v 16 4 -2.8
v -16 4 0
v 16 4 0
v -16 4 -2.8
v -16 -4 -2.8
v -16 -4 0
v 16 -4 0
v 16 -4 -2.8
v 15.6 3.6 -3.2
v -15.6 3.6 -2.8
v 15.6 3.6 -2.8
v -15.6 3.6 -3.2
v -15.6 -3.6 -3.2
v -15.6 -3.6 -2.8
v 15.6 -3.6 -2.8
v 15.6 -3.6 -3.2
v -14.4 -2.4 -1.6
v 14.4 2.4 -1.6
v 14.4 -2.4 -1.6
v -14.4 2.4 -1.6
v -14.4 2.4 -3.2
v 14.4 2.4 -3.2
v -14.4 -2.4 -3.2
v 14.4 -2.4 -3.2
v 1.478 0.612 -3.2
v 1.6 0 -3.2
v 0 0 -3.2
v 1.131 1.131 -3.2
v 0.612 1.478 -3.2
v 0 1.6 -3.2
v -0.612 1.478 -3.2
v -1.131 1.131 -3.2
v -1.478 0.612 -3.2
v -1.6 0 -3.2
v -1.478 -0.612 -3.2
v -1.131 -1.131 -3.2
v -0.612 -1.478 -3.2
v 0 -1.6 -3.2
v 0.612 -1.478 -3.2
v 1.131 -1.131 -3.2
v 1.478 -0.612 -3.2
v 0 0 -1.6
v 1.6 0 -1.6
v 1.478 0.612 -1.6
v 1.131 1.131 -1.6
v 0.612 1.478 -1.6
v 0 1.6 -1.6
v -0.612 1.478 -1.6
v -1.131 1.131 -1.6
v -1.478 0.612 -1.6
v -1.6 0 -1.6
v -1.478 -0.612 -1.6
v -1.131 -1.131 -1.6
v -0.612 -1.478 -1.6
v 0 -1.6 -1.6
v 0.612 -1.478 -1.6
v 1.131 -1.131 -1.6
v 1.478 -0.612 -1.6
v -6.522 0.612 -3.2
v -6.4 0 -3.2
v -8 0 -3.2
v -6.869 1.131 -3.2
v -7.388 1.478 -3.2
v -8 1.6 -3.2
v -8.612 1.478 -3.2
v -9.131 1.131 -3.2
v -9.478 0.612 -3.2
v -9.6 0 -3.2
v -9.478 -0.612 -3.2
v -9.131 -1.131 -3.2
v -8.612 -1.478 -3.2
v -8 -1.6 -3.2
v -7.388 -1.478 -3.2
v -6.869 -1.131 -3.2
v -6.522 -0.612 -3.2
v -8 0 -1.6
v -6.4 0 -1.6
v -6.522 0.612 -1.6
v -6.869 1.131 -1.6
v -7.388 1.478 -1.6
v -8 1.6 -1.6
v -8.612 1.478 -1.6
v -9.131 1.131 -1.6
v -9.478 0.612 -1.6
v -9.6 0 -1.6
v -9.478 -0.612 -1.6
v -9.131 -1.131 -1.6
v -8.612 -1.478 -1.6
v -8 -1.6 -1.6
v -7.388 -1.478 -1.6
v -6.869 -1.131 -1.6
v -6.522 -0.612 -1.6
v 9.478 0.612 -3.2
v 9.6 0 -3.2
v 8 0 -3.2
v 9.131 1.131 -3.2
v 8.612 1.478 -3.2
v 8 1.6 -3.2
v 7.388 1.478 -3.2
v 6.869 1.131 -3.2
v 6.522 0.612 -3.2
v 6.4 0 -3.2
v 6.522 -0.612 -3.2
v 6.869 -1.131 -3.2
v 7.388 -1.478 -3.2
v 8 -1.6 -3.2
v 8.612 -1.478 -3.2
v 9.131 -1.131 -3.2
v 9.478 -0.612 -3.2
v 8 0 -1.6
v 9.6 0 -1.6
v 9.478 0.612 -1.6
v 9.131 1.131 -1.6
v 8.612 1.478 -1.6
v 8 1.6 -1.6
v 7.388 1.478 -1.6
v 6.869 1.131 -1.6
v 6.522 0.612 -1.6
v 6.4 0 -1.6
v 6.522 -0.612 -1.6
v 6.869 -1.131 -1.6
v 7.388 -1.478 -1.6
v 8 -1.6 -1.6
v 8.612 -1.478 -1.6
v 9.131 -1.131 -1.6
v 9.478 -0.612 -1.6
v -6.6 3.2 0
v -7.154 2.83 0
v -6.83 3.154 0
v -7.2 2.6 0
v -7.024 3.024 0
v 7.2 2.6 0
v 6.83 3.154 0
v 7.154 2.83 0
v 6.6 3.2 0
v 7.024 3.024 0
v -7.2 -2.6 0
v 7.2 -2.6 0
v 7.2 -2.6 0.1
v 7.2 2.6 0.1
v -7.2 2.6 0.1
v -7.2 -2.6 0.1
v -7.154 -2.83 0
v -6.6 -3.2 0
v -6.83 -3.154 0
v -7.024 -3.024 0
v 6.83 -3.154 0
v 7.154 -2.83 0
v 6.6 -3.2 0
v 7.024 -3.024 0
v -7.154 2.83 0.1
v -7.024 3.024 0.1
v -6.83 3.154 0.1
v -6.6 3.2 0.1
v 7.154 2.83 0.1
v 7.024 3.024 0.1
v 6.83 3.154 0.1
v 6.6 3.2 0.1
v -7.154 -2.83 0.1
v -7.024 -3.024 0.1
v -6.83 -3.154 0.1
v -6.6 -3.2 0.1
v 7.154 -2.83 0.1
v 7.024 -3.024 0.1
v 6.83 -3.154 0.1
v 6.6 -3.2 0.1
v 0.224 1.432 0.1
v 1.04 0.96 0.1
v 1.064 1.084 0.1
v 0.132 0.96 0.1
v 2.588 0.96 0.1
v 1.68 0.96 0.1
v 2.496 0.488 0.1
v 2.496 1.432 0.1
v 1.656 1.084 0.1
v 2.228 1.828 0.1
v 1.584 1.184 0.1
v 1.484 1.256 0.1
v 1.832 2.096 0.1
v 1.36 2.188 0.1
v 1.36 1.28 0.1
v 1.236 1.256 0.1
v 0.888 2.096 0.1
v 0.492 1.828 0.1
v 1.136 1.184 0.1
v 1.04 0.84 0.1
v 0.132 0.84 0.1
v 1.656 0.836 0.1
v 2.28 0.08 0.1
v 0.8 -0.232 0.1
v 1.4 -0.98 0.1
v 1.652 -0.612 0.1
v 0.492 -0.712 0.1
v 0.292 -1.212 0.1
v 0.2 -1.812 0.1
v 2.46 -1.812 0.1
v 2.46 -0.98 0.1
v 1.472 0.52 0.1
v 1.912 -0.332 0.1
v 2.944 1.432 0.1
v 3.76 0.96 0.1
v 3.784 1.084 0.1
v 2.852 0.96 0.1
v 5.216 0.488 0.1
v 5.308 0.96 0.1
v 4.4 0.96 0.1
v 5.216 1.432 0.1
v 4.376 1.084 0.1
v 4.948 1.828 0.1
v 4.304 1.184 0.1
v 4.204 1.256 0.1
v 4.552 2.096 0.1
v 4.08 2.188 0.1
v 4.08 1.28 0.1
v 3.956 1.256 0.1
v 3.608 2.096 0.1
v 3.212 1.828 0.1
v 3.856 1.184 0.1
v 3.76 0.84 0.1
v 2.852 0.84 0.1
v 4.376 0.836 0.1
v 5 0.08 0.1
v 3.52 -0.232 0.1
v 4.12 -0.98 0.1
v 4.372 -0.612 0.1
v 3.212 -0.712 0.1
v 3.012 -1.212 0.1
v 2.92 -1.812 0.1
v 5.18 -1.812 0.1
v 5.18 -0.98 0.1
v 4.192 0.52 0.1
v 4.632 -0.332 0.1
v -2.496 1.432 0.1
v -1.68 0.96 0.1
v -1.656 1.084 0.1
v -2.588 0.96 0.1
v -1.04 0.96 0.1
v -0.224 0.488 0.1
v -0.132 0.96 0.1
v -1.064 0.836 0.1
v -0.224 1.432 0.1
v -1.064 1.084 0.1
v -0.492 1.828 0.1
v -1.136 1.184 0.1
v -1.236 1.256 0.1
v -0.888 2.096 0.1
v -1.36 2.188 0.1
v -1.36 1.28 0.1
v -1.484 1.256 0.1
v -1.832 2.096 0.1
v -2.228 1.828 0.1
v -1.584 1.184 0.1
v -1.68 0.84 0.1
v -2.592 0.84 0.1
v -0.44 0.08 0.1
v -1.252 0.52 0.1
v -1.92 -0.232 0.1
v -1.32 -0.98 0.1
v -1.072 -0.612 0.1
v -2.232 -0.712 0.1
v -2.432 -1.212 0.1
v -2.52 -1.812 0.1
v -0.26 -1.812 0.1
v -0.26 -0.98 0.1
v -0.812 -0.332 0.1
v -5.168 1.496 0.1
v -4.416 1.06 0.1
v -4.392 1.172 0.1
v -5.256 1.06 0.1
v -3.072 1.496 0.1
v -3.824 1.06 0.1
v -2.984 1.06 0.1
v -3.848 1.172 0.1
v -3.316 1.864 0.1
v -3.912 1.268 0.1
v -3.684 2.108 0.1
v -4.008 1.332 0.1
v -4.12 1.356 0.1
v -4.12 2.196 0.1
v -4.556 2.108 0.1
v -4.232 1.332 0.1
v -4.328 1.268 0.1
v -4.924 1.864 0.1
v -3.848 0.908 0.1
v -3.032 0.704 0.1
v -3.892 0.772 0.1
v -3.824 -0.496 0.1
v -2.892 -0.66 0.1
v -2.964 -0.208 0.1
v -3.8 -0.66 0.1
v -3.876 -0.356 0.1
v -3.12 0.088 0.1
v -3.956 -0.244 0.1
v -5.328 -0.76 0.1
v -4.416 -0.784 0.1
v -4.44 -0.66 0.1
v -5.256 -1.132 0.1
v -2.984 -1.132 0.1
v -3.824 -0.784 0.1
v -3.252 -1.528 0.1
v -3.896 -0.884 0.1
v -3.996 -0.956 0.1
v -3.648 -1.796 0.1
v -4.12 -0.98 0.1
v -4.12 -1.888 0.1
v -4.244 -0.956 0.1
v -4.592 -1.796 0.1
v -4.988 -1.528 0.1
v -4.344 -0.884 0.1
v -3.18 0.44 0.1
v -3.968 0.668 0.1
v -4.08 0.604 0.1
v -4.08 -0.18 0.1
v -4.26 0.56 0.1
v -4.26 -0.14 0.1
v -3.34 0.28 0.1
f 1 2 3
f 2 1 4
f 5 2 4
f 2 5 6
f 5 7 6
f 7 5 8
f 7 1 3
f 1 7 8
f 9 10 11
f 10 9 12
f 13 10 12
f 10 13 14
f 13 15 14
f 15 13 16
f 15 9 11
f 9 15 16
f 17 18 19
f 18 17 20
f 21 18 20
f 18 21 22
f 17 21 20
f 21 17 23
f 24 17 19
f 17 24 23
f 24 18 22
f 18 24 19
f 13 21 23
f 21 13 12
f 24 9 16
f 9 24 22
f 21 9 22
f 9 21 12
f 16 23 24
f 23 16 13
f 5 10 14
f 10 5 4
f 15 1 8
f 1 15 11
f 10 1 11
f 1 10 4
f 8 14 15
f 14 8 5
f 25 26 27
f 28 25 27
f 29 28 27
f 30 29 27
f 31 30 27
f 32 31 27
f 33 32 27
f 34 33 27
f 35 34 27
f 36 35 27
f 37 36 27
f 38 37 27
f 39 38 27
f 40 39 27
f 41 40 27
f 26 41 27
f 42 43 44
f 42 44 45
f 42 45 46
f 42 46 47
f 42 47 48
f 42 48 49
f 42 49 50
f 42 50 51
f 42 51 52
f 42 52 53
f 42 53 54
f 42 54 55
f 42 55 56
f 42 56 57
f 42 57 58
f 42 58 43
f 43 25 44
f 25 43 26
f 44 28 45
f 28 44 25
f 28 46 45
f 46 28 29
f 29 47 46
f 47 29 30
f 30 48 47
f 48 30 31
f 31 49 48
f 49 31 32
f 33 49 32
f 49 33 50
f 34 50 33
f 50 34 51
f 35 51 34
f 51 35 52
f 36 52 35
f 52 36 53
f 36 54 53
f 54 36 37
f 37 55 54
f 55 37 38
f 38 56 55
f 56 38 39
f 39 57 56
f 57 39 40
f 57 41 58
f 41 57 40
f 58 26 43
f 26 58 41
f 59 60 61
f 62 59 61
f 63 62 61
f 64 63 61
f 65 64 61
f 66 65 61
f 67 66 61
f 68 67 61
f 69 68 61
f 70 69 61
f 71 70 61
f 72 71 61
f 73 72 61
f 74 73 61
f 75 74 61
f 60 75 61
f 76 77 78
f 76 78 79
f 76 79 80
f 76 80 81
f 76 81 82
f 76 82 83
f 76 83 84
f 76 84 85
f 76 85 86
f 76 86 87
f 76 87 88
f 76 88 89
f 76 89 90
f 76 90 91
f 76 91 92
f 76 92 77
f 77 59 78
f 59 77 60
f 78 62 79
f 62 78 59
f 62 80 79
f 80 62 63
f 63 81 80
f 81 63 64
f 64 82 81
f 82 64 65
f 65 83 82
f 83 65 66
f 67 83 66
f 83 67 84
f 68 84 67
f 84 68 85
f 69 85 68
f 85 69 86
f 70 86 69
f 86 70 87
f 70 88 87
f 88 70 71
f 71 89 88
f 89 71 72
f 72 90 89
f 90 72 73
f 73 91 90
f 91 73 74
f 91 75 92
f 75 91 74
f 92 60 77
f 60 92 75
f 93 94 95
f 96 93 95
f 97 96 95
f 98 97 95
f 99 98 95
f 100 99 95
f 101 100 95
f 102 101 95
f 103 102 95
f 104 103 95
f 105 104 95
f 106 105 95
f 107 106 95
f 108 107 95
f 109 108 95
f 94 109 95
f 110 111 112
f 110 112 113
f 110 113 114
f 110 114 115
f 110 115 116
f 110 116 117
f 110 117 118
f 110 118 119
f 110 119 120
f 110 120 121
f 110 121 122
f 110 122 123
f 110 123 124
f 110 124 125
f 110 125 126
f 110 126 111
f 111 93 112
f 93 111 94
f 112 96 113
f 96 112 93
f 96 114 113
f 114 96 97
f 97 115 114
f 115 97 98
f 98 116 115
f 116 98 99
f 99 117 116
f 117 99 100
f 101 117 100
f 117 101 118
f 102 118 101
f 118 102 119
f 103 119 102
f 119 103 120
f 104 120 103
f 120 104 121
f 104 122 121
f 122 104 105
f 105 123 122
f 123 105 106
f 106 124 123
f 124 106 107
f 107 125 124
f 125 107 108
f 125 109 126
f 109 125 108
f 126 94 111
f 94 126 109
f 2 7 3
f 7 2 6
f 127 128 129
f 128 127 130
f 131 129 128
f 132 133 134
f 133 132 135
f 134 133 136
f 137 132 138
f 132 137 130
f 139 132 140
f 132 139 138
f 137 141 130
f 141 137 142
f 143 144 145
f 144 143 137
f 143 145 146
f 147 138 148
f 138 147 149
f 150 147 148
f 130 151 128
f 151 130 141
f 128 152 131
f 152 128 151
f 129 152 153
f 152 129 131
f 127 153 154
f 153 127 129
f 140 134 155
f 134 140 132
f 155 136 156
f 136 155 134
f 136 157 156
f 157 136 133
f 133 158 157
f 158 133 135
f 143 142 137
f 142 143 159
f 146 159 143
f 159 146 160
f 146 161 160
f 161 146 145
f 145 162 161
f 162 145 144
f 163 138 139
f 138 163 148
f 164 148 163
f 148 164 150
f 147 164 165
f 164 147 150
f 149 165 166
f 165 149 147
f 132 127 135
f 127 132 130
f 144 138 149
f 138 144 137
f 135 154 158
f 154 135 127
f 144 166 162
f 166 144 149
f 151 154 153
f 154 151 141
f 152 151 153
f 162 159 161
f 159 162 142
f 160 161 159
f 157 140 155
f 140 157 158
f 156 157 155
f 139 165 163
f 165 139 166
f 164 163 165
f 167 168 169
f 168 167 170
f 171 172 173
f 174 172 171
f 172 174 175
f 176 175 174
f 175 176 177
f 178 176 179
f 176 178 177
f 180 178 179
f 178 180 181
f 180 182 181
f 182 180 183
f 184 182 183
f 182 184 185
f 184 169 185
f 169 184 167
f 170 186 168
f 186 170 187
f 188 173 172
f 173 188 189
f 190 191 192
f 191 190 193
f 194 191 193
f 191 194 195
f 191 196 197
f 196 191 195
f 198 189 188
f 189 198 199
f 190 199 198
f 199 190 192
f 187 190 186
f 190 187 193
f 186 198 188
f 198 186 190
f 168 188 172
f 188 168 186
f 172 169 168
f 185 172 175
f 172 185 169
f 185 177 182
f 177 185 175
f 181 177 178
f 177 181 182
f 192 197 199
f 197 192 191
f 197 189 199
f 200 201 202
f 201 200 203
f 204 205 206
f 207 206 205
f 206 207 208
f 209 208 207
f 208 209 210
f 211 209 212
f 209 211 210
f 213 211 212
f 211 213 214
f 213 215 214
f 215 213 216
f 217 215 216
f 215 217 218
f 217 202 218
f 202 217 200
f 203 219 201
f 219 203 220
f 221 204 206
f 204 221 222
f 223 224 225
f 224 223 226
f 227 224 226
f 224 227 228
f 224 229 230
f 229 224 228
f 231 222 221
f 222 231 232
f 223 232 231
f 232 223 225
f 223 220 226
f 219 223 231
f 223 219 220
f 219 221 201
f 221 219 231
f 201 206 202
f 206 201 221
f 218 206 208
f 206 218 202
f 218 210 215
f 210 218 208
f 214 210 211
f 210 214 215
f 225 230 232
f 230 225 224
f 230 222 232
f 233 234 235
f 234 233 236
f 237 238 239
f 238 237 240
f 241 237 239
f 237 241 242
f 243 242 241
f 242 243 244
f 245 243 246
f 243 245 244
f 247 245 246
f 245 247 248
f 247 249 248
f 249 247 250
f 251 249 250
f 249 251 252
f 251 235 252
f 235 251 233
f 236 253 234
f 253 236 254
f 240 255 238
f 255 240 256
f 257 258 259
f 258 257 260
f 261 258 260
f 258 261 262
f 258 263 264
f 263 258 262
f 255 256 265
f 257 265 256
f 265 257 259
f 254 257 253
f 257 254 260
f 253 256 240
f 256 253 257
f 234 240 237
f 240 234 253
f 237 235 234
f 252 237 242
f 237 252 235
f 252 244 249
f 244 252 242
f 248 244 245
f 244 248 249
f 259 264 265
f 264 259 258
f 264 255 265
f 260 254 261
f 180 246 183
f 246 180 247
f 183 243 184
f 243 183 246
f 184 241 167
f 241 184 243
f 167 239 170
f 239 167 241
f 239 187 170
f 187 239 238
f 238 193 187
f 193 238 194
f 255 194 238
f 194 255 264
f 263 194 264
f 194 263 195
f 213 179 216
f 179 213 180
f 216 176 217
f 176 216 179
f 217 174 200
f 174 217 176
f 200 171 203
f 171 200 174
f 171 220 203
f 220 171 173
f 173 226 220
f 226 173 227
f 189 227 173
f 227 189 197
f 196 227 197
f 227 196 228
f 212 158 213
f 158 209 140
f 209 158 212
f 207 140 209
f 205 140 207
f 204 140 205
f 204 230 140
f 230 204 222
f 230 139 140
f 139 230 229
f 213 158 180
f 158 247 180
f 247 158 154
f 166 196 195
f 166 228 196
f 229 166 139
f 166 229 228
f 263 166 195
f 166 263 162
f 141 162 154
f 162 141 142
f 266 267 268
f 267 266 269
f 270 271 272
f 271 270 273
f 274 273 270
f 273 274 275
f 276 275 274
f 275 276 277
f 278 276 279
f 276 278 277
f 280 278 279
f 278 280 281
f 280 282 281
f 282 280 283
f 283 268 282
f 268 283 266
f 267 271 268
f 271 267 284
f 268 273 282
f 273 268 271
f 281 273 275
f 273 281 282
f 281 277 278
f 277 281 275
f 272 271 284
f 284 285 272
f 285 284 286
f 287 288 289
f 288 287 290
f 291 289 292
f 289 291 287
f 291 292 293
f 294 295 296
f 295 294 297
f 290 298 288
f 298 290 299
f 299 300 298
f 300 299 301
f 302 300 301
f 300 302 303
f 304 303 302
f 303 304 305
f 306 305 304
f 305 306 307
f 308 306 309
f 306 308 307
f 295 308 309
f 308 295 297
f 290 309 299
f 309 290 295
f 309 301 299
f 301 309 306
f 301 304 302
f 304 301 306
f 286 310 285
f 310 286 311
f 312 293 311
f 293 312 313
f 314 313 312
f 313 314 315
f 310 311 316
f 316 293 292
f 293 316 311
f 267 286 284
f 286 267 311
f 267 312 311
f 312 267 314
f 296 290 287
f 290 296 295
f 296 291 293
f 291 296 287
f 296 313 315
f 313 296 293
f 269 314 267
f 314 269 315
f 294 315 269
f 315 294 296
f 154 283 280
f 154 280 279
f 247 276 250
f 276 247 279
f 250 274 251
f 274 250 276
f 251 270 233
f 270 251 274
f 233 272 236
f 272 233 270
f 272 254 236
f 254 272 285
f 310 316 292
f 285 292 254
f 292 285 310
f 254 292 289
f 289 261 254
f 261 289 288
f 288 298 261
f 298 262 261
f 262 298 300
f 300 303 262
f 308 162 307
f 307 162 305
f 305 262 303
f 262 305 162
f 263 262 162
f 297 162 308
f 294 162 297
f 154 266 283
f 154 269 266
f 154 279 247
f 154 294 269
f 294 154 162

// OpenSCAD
use <../lib.scad>
use <2431.scad>
use <4578235a.scad>
function ldraw_lib__2431d0k() = [
// 0 Tile  1 x  4 with White "3222" on Blue Background Sticker
// 0 Name: 2431d0k.dat
// 0 Author: Evert-Jan Boer [ejboer]
// 0 !LDRAW_ORG Shortcut UPDATE 2026-07
// 0 !LICENSE Licensed under CC BY 4.0 : see CAreadme.txt
// 
// 0 BFC CERTIFY CCW
  [0,"BFC","CERTIFY"],
  [0,"BFC","CCW"],
// 
// 0 !CATEGORY Sticker Shortcut
// 0 !KEYWORDS Bricklink 2431pb145, Set 3222
// 
// 0 !HISTORY 2026-07-30 [OrionP] Official Update 2026-07
// 
// 1 16 0 0 0 1 0 0 0 1 0 0 0 1 2431.dat
  [1,16,0,0,0,1,0,0,0,1,0,0,0,1, ldraw_lib__2431()],
// 1 16 0 0 0 1 0 0 0 1 0 0 0 1 4578235a.dat
  [1,16,0,0,0,1,0,0,0,1,0,0,0,1, ldraw_lib__4578235a()],
];
module ldraw_lib__2431d0k(step=0, col=false, unit=2/5, alt=false, line=0.2, solid=!$preview)
    makepoly(ldraw_lib__2431d0k(), step=step, col=col, unit=unit, alt=alt, line=line, solid=solid);
ldraw_lib__2431d0k(line=0.2);
